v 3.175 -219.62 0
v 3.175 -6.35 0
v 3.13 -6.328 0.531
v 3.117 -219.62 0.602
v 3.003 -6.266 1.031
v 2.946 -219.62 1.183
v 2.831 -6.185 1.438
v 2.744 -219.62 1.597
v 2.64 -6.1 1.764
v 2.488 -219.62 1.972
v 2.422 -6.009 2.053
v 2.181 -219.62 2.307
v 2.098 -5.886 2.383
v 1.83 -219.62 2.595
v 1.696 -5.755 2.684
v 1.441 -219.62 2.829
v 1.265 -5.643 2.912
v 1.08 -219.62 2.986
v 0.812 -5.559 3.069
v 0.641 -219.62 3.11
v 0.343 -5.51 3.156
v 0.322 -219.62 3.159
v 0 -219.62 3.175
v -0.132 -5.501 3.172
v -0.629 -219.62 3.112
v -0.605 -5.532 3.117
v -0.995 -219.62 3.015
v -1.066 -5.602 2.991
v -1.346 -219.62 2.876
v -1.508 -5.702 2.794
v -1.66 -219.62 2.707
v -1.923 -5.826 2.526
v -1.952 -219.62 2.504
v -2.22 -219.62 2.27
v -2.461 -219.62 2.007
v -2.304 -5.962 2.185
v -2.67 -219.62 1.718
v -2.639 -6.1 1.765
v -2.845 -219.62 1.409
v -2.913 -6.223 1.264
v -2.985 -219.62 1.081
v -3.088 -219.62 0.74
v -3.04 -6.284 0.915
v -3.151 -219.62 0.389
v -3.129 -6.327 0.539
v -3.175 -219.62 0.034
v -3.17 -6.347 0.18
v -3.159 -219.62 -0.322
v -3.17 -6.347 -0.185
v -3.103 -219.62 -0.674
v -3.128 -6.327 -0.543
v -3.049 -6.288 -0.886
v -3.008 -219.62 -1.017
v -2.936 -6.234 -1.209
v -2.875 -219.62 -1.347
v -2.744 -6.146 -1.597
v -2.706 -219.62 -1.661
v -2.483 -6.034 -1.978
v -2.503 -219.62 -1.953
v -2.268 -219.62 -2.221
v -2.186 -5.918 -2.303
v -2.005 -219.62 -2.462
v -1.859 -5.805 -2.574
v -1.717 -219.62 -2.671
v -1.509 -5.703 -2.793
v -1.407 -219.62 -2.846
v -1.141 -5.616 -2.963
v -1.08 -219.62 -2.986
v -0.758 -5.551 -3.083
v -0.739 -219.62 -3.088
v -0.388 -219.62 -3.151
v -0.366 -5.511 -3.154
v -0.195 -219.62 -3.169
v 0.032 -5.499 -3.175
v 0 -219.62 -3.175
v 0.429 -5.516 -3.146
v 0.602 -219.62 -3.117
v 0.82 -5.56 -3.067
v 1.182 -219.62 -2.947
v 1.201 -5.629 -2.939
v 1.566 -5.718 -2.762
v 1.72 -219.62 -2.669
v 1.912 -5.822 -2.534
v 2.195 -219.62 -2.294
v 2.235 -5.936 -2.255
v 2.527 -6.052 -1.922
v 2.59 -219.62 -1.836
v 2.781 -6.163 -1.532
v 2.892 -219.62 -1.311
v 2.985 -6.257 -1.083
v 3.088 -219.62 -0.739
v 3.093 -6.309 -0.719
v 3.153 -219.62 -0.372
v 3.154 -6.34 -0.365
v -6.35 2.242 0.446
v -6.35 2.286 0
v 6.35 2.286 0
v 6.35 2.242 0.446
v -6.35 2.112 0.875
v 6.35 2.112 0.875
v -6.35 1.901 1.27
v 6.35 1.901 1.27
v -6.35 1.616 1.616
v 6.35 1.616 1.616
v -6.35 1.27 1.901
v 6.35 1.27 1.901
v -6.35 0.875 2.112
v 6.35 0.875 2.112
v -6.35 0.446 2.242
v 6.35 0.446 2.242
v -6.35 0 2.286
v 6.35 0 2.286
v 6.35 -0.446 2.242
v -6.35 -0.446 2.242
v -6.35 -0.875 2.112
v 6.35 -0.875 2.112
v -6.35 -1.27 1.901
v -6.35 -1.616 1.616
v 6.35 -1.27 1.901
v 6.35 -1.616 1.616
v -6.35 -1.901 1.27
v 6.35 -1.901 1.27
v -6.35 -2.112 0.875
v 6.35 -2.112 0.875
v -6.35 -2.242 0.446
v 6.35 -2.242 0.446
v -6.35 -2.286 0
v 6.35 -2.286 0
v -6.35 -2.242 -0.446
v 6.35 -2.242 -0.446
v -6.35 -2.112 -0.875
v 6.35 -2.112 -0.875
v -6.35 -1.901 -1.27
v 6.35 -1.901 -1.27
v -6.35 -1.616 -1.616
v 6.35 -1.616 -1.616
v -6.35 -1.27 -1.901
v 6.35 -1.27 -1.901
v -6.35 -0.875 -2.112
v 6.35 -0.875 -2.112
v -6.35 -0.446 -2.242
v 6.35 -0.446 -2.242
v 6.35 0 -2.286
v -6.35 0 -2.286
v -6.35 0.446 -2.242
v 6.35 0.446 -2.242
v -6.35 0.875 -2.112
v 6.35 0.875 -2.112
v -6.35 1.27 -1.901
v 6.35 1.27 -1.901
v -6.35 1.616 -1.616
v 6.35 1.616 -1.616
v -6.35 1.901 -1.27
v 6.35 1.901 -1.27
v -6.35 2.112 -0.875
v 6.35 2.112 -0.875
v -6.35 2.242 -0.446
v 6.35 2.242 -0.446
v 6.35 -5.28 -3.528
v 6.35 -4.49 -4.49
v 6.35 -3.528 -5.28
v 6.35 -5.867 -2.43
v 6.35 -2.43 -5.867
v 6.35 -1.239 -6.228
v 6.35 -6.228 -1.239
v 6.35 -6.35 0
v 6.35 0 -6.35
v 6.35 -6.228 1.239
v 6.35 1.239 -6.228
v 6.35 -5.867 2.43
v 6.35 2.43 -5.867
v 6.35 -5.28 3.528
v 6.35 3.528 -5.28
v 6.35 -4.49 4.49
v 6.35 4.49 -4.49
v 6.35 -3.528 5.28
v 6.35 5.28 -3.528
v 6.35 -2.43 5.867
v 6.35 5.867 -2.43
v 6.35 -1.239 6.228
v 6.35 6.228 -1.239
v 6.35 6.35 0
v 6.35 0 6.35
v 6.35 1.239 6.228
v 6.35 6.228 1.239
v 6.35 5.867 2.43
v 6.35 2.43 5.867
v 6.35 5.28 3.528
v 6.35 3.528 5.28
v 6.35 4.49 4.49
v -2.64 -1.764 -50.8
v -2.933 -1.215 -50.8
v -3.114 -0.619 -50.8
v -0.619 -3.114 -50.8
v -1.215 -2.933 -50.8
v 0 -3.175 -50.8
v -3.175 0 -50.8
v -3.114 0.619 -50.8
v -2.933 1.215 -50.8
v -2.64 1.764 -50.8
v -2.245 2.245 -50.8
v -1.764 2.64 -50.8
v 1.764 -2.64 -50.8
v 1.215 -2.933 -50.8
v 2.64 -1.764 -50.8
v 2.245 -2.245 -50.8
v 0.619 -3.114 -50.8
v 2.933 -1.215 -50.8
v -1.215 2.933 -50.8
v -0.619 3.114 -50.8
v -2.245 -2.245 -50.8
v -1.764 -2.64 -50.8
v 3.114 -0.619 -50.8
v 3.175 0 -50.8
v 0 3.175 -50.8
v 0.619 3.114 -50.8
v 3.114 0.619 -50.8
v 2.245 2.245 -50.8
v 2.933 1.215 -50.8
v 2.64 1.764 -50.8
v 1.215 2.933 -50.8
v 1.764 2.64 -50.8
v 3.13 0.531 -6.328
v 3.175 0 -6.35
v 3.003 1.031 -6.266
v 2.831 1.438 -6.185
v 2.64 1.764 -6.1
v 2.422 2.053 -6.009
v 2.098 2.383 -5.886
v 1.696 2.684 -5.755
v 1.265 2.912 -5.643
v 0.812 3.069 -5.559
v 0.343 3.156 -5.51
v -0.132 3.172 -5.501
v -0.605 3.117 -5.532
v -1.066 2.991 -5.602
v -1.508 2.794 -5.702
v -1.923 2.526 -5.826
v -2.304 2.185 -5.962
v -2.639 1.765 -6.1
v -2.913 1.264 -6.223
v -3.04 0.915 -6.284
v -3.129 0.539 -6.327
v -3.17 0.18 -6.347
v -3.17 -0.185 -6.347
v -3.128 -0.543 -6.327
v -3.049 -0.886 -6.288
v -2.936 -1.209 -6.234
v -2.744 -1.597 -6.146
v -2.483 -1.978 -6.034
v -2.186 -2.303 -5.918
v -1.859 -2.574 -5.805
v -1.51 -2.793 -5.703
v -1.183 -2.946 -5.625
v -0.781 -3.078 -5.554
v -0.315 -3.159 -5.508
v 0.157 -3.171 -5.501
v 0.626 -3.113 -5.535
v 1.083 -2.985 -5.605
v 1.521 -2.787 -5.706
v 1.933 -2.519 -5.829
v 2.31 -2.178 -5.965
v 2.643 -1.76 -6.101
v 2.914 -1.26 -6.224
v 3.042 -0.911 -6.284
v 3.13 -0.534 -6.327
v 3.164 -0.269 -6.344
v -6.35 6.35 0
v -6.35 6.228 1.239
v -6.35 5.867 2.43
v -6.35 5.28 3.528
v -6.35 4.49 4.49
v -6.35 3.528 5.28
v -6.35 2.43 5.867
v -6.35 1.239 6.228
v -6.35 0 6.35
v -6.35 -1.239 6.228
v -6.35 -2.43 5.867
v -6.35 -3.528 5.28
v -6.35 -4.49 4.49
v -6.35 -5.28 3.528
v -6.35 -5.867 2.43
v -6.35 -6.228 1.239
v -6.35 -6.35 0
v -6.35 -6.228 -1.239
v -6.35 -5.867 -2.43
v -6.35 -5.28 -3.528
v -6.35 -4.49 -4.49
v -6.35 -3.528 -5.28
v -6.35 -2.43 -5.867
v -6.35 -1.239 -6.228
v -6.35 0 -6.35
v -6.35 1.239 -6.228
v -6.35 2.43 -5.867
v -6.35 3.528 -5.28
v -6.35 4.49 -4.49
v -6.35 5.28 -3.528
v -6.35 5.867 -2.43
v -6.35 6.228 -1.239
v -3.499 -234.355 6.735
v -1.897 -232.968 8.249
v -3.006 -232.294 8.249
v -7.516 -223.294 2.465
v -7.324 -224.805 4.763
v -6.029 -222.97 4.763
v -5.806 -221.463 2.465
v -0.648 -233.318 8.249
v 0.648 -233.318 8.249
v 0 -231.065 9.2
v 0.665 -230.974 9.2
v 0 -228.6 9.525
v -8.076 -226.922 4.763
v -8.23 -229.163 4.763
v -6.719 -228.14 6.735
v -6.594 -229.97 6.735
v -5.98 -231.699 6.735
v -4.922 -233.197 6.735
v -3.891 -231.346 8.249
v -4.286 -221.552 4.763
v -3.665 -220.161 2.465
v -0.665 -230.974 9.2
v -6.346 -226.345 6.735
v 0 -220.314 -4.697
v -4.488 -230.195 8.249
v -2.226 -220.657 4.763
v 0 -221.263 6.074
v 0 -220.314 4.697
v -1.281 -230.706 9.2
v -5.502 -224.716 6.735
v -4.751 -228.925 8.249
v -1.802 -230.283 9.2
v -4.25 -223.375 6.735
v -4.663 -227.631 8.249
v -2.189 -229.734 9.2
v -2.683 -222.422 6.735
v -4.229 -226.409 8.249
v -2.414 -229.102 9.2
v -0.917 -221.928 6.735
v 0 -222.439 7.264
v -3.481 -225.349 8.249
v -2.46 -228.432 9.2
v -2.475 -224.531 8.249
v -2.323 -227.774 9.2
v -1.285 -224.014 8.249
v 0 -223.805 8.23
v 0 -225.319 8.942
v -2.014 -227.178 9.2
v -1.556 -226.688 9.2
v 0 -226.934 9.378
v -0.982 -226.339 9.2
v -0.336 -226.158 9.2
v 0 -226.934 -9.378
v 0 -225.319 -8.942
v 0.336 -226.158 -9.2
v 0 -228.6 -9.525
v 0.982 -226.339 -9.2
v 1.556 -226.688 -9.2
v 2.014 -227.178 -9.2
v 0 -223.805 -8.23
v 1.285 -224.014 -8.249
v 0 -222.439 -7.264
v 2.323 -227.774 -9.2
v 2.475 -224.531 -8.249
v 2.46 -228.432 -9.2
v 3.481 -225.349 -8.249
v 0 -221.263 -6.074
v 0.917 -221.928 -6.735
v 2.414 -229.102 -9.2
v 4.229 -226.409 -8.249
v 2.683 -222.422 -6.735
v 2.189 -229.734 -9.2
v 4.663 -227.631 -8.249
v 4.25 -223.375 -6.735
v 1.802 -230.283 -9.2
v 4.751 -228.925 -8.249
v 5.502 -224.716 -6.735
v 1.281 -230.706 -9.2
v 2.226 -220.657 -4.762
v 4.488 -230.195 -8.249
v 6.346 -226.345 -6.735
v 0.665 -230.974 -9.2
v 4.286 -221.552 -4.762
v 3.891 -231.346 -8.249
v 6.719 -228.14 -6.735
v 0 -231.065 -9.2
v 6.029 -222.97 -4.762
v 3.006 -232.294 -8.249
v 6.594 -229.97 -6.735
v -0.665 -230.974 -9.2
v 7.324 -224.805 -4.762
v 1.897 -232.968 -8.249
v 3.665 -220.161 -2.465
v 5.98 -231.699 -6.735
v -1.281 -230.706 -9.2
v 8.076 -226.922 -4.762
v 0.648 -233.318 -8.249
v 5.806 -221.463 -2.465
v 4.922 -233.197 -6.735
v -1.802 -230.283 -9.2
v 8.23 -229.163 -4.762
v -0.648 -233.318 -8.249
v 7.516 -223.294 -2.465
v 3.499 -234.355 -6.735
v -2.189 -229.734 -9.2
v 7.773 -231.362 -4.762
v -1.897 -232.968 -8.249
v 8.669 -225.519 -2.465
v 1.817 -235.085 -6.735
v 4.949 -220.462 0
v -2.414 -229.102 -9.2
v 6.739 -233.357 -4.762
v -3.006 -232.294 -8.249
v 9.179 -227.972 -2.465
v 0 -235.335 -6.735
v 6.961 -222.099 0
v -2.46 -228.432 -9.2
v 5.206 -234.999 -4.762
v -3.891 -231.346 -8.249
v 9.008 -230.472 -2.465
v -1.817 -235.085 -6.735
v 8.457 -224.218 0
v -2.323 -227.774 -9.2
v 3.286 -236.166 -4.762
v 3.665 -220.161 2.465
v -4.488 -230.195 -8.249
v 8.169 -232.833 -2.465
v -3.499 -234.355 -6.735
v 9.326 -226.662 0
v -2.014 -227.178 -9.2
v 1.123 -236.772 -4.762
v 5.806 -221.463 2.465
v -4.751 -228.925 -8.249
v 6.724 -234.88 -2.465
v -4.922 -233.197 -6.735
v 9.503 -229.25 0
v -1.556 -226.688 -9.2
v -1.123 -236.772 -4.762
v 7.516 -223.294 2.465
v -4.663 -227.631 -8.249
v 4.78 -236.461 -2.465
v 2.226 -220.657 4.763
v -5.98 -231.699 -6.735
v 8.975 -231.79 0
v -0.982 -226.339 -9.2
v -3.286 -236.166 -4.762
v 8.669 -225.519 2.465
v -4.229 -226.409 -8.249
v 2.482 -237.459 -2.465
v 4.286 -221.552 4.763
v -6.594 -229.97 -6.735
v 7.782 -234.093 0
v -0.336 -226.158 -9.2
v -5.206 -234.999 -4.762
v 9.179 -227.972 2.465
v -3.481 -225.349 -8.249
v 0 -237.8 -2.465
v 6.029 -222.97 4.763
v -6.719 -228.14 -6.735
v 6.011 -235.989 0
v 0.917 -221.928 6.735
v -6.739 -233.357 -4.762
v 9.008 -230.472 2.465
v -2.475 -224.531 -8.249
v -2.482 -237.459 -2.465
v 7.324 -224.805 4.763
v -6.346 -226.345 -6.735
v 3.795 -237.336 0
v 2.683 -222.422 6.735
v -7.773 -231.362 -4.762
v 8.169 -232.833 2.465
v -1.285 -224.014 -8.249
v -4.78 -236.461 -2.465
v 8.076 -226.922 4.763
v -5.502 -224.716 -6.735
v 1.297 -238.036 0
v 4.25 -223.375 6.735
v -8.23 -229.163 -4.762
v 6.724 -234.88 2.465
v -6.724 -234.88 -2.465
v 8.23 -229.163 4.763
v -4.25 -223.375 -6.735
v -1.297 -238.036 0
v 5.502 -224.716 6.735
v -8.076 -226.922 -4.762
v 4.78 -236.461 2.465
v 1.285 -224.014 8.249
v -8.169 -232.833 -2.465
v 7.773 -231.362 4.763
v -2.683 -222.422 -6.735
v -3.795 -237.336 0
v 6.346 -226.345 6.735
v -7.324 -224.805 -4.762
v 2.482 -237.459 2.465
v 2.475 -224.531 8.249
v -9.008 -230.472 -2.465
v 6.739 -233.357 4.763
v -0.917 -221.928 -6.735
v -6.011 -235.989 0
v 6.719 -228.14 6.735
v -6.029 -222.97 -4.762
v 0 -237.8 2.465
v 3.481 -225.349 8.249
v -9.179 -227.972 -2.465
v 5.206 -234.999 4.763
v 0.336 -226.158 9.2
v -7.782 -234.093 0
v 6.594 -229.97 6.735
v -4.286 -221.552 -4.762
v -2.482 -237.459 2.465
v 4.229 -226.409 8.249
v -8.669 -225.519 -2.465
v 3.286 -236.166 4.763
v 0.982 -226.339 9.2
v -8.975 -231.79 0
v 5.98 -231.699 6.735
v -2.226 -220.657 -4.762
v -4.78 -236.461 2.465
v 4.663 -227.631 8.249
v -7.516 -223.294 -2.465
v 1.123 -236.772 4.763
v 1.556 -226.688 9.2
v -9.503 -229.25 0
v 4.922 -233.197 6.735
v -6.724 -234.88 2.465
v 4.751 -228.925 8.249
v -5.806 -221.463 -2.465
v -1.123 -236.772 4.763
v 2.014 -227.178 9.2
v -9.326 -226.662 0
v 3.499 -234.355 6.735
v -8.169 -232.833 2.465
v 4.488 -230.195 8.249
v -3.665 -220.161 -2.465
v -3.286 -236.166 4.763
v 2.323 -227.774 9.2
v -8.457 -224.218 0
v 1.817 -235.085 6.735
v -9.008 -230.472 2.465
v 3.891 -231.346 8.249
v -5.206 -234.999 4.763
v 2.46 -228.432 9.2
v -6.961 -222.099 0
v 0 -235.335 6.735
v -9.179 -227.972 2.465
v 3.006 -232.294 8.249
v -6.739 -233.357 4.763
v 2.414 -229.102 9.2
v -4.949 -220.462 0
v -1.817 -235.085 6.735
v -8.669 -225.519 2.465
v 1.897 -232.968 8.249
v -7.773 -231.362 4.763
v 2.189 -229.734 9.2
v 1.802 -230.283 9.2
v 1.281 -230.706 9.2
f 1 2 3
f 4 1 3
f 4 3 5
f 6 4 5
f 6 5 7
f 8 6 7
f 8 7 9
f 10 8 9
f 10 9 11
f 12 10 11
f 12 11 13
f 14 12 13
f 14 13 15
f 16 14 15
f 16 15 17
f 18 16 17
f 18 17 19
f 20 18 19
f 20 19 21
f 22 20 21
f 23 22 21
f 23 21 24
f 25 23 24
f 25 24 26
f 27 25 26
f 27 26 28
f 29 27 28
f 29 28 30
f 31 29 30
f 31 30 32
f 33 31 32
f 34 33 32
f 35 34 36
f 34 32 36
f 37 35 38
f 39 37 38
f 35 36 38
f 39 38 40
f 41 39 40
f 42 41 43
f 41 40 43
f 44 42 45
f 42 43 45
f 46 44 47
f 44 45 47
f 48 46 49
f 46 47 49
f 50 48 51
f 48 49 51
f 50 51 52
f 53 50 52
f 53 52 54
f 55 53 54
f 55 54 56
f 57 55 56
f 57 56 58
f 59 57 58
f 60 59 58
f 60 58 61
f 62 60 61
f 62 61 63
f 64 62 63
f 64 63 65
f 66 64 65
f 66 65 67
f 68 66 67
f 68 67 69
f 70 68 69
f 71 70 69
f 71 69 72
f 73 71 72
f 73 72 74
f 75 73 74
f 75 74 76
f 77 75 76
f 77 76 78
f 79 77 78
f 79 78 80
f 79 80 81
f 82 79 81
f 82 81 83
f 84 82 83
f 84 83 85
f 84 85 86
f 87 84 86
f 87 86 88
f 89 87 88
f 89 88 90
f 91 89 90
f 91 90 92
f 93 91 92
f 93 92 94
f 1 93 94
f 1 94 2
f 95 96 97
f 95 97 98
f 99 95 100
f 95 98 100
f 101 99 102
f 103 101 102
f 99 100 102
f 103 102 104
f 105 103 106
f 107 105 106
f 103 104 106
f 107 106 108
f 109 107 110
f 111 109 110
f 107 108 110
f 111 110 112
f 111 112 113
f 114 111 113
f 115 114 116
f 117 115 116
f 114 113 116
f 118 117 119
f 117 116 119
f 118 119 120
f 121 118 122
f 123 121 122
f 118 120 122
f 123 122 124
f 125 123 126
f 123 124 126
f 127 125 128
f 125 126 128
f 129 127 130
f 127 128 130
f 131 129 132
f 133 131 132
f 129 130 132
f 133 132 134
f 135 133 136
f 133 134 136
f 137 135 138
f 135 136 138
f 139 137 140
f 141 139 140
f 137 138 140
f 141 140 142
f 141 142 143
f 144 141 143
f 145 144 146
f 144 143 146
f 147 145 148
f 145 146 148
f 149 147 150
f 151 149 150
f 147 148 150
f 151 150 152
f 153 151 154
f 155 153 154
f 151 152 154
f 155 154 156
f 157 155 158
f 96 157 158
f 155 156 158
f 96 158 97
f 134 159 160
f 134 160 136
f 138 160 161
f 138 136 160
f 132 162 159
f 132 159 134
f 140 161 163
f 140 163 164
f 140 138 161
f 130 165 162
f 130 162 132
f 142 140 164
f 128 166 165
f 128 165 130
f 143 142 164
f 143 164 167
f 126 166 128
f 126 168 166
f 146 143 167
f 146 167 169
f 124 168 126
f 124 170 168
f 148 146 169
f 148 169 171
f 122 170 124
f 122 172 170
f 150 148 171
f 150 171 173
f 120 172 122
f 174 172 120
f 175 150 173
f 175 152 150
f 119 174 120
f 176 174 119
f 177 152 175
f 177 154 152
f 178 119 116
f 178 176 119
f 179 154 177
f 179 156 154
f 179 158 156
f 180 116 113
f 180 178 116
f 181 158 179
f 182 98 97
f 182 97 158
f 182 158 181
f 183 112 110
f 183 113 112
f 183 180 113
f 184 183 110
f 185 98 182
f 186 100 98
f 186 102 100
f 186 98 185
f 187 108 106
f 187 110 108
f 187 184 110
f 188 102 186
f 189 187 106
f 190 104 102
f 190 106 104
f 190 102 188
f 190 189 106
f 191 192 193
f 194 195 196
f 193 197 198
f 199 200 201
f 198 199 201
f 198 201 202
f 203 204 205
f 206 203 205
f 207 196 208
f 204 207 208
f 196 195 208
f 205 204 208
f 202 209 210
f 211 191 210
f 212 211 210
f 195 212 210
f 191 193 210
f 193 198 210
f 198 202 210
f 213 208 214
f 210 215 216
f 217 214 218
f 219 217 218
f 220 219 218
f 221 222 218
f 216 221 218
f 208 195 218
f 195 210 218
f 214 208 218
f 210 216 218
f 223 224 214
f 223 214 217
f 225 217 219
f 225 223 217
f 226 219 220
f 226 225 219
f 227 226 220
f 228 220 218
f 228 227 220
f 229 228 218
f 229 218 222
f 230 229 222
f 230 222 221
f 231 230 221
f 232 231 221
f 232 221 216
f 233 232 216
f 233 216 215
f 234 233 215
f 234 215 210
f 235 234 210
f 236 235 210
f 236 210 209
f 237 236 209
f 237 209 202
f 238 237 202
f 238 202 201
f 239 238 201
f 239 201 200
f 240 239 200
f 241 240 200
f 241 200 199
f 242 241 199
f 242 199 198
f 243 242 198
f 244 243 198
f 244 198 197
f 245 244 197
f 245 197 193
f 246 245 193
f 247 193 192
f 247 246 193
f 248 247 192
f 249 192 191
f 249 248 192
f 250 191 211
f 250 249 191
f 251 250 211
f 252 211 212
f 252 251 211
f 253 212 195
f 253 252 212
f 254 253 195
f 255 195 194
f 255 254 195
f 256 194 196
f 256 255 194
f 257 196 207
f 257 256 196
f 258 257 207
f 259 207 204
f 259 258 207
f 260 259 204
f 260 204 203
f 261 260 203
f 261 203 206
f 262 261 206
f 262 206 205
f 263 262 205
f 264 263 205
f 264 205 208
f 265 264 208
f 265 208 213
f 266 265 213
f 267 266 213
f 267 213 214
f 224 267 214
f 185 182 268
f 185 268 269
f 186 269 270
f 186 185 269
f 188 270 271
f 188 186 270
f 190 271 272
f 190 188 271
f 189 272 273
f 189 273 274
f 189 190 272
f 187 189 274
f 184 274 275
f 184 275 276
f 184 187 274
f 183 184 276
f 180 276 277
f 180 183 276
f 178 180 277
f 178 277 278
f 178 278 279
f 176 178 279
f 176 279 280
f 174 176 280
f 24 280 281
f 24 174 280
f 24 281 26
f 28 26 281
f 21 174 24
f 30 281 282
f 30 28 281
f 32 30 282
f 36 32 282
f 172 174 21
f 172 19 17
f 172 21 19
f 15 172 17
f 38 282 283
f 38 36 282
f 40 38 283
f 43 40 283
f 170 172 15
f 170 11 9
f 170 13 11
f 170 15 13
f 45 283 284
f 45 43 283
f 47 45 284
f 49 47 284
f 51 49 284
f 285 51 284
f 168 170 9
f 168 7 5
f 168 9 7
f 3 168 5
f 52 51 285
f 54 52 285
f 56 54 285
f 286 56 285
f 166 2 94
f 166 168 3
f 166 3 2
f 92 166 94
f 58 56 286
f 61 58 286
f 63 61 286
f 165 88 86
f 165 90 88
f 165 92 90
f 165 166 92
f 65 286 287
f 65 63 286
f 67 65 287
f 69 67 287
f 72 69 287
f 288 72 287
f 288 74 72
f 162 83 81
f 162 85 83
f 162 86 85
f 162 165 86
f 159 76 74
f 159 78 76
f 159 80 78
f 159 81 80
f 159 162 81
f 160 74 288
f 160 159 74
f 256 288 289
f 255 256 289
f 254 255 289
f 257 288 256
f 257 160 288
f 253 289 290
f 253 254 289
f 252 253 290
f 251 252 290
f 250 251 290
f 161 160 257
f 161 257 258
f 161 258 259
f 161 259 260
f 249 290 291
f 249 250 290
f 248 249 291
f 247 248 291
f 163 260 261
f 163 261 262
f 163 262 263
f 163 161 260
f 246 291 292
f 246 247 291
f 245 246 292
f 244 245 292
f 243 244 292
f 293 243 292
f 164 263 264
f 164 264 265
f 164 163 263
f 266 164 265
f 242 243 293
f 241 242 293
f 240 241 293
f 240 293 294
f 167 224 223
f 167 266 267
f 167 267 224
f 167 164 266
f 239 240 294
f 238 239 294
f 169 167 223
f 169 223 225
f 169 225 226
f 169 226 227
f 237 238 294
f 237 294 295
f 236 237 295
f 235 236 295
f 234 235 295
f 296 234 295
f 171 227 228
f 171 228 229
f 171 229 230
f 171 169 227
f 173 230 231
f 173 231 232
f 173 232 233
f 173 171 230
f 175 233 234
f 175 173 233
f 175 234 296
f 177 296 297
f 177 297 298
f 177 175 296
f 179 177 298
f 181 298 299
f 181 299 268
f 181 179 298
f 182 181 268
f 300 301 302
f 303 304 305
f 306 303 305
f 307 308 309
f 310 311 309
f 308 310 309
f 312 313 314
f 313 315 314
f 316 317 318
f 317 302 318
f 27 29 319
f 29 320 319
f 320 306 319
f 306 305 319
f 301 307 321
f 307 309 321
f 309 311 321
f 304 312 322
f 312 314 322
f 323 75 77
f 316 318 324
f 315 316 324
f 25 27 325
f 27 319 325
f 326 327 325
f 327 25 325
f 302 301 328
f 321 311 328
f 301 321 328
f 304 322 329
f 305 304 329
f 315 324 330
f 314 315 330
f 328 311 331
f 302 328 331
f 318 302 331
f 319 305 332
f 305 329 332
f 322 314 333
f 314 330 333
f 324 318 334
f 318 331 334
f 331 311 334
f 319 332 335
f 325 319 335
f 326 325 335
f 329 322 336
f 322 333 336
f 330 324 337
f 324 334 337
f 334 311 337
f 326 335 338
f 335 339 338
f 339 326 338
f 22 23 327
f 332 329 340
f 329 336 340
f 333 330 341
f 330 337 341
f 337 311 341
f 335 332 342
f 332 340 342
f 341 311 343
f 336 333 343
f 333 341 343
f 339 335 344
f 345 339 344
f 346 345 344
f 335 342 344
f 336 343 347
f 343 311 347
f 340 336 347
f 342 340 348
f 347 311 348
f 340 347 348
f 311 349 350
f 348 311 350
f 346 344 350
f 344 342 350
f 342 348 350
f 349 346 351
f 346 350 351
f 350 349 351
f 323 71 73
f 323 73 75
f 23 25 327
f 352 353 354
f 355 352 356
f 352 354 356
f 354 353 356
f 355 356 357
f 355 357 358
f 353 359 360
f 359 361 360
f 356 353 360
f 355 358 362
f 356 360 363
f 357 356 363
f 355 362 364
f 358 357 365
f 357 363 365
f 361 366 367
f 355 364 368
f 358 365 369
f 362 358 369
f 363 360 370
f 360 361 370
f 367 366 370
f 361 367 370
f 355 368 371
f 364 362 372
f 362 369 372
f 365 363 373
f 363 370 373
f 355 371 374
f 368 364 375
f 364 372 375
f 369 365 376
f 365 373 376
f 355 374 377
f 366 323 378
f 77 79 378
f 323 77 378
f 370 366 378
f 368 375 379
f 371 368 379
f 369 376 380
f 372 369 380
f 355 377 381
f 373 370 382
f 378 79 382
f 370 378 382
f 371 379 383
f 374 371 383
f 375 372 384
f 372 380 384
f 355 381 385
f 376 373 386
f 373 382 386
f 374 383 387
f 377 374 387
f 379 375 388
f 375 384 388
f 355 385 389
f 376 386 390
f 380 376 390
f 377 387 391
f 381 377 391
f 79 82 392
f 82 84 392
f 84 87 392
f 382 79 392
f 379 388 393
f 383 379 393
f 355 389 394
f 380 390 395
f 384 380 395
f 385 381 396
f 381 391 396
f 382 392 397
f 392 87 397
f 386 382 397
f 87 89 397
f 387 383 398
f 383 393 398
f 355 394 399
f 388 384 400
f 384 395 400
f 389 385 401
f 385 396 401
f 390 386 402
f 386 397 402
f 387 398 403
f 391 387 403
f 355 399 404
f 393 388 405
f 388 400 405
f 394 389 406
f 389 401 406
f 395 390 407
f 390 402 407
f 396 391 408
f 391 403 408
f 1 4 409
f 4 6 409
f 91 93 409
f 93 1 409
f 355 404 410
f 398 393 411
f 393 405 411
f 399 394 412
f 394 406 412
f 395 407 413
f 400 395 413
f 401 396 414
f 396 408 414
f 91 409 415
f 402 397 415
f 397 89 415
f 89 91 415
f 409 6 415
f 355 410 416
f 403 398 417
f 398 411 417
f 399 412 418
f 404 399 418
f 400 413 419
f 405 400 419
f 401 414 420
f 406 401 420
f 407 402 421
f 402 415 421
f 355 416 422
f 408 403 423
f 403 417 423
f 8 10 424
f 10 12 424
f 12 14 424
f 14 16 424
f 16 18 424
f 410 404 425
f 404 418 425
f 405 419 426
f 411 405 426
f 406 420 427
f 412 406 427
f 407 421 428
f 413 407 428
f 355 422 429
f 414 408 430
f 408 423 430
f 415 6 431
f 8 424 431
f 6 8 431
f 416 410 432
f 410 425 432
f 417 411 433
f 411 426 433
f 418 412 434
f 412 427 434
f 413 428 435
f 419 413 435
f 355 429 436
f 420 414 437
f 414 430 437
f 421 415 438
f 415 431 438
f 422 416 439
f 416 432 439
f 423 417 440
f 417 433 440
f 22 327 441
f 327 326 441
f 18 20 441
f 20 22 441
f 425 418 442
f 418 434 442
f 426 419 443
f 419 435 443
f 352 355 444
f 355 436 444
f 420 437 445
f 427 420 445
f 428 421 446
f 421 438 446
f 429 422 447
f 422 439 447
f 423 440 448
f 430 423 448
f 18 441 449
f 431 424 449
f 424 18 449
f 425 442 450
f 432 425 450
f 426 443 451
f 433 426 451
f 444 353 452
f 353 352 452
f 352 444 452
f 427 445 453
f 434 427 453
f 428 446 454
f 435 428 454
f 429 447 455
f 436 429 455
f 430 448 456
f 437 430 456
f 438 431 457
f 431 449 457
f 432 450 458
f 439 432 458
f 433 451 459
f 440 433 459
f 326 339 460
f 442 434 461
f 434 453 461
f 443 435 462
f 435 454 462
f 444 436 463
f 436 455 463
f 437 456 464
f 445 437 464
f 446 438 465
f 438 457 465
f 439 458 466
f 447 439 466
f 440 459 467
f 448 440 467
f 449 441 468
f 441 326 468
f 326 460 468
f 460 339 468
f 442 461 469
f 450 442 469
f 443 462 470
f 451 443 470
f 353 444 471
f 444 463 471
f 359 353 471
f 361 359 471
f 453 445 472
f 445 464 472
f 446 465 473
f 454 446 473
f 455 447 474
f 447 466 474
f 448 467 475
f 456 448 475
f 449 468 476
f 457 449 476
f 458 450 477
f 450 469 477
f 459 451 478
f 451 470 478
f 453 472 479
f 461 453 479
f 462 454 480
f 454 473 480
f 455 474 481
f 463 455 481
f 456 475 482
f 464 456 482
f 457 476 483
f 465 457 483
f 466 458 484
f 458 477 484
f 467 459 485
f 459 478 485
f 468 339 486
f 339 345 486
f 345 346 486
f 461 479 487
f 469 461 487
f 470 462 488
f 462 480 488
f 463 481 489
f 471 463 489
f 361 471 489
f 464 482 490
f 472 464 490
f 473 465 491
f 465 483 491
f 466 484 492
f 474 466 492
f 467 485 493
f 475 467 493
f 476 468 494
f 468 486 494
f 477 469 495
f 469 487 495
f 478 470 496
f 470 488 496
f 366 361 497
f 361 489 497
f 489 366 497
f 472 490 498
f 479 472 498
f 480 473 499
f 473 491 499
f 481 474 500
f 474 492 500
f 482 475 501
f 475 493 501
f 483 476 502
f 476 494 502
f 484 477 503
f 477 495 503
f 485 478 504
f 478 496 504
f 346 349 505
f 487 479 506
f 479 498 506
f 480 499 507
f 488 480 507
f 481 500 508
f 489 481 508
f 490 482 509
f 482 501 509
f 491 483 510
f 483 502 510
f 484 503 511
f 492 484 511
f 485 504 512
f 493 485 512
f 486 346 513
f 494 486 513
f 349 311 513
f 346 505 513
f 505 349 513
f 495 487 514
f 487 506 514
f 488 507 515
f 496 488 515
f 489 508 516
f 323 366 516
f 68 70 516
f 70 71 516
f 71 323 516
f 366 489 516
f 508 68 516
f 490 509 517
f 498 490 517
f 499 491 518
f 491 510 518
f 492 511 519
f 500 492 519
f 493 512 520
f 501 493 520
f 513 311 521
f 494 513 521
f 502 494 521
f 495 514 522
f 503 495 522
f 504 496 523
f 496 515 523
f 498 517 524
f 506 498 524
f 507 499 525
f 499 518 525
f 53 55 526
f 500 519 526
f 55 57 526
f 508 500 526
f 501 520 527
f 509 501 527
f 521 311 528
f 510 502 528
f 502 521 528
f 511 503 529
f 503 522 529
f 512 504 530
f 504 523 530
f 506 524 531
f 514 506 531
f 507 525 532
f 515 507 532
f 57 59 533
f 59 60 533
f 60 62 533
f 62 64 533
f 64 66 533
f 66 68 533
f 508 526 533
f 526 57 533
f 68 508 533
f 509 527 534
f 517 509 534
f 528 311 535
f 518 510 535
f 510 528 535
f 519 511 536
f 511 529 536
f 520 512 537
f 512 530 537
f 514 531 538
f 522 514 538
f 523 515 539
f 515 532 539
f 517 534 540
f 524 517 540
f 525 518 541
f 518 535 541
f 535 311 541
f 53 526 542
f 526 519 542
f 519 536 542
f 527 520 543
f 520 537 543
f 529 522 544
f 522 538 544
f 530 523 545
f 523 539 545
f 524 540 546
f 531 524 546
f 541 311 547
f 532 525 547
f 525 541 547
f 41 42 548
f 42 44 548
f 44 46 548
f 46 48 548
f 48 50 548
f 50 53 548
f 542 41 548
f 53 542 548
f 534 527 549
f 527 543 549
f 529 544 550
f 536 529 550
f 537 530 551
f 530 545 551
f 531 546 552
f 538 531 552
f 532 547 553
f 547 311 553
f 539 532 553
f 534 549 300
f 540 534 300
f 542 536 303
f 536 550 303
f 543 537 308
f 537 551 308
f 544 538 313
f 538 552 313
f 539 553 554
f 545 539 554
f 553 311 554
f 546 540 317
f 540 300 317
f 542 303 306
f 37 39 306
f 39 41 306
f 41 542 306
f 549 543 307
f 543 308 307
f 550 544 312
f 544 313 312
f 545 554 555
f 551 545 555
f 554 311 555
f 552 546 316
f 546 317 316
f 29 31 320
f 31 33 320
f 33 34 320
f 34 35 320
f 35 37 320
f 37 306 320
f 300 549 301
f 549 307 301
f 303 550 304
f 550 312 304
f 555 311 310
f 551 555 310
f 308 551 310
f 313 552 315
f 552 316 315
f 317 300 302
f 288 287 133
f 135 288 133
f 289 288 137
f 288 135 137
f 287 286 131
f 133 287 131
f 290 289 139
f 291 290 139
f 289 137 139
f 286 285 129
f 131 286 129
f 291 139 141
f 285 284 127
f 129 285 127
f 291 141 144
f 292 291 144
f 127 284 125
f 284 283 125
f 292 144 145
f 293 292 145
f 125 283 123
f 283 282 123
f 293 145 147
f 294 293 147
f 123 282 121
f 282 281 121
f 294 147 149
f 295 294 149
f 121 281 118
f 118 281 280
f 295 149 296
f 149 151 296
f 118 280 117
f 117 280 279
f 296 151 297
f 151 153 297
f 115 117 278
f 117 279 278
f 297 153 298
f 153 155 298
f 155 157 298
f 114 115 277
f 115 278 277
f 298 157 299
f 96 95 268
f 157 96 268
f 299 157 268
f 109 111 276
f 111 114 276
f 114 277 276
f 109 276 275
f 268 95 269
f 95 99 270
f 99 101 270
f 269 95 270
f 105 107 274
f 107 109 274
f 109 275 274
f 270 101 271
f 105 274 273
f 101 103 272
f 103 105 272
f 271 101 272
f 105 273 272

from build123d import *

# Parameters (mm, degrees)
F0_R     = 3.175
F1_DEPTH = 228.6
F2_R     = 3.175
F3_DEPTH = 50.8
F4_R     = 6.35
F5_DEPTH = 6.35
F8_R     = 2.286
F9_DEPTH = 63.5


with BuildPart() as f1:
    # F0 (on Front) → F1 (new body)
    with BuildSketch(Plane.XZ):
        Circle(F0_R)
    extrude(amount=F1_DEPTH)

    # F2 (on Top) → F3 (join)
    with BuildSketch(Plane.XY):
        Circle(F2_R)
    extrude(amount=-F3_DEPTH)

    # F4 (on Right) → F5 (join, symmetric)
    with BuildSketch(Plane.YZ):
        Circle(F4_R)
    extrude(amount=F5_DEPTH, both=True)

    # F6 (on Right) → F7 (revolve)
    with BuildSketch(Plane.YZ):
        with BuildLine():
            Line((-228.6, 9.525), (-228.6, -9.525))
            ThreePointArc((-228.6, -9.525), (-219.075, 0), (-228.6, 9.525))
        make_face()
    revolve(axis=Axis((0, -228.6, 0), (0, 0, -1)))

    # F8 (on face) → F9 (cut, symmetric)
    with BuildSketch(Plane.YZ.offset(6.35)):
        Circle(F8_R)
    extrude(amount=F9_DEPTH, both=True, mode=Mode.SUBTRACT)


solid = f1.part
